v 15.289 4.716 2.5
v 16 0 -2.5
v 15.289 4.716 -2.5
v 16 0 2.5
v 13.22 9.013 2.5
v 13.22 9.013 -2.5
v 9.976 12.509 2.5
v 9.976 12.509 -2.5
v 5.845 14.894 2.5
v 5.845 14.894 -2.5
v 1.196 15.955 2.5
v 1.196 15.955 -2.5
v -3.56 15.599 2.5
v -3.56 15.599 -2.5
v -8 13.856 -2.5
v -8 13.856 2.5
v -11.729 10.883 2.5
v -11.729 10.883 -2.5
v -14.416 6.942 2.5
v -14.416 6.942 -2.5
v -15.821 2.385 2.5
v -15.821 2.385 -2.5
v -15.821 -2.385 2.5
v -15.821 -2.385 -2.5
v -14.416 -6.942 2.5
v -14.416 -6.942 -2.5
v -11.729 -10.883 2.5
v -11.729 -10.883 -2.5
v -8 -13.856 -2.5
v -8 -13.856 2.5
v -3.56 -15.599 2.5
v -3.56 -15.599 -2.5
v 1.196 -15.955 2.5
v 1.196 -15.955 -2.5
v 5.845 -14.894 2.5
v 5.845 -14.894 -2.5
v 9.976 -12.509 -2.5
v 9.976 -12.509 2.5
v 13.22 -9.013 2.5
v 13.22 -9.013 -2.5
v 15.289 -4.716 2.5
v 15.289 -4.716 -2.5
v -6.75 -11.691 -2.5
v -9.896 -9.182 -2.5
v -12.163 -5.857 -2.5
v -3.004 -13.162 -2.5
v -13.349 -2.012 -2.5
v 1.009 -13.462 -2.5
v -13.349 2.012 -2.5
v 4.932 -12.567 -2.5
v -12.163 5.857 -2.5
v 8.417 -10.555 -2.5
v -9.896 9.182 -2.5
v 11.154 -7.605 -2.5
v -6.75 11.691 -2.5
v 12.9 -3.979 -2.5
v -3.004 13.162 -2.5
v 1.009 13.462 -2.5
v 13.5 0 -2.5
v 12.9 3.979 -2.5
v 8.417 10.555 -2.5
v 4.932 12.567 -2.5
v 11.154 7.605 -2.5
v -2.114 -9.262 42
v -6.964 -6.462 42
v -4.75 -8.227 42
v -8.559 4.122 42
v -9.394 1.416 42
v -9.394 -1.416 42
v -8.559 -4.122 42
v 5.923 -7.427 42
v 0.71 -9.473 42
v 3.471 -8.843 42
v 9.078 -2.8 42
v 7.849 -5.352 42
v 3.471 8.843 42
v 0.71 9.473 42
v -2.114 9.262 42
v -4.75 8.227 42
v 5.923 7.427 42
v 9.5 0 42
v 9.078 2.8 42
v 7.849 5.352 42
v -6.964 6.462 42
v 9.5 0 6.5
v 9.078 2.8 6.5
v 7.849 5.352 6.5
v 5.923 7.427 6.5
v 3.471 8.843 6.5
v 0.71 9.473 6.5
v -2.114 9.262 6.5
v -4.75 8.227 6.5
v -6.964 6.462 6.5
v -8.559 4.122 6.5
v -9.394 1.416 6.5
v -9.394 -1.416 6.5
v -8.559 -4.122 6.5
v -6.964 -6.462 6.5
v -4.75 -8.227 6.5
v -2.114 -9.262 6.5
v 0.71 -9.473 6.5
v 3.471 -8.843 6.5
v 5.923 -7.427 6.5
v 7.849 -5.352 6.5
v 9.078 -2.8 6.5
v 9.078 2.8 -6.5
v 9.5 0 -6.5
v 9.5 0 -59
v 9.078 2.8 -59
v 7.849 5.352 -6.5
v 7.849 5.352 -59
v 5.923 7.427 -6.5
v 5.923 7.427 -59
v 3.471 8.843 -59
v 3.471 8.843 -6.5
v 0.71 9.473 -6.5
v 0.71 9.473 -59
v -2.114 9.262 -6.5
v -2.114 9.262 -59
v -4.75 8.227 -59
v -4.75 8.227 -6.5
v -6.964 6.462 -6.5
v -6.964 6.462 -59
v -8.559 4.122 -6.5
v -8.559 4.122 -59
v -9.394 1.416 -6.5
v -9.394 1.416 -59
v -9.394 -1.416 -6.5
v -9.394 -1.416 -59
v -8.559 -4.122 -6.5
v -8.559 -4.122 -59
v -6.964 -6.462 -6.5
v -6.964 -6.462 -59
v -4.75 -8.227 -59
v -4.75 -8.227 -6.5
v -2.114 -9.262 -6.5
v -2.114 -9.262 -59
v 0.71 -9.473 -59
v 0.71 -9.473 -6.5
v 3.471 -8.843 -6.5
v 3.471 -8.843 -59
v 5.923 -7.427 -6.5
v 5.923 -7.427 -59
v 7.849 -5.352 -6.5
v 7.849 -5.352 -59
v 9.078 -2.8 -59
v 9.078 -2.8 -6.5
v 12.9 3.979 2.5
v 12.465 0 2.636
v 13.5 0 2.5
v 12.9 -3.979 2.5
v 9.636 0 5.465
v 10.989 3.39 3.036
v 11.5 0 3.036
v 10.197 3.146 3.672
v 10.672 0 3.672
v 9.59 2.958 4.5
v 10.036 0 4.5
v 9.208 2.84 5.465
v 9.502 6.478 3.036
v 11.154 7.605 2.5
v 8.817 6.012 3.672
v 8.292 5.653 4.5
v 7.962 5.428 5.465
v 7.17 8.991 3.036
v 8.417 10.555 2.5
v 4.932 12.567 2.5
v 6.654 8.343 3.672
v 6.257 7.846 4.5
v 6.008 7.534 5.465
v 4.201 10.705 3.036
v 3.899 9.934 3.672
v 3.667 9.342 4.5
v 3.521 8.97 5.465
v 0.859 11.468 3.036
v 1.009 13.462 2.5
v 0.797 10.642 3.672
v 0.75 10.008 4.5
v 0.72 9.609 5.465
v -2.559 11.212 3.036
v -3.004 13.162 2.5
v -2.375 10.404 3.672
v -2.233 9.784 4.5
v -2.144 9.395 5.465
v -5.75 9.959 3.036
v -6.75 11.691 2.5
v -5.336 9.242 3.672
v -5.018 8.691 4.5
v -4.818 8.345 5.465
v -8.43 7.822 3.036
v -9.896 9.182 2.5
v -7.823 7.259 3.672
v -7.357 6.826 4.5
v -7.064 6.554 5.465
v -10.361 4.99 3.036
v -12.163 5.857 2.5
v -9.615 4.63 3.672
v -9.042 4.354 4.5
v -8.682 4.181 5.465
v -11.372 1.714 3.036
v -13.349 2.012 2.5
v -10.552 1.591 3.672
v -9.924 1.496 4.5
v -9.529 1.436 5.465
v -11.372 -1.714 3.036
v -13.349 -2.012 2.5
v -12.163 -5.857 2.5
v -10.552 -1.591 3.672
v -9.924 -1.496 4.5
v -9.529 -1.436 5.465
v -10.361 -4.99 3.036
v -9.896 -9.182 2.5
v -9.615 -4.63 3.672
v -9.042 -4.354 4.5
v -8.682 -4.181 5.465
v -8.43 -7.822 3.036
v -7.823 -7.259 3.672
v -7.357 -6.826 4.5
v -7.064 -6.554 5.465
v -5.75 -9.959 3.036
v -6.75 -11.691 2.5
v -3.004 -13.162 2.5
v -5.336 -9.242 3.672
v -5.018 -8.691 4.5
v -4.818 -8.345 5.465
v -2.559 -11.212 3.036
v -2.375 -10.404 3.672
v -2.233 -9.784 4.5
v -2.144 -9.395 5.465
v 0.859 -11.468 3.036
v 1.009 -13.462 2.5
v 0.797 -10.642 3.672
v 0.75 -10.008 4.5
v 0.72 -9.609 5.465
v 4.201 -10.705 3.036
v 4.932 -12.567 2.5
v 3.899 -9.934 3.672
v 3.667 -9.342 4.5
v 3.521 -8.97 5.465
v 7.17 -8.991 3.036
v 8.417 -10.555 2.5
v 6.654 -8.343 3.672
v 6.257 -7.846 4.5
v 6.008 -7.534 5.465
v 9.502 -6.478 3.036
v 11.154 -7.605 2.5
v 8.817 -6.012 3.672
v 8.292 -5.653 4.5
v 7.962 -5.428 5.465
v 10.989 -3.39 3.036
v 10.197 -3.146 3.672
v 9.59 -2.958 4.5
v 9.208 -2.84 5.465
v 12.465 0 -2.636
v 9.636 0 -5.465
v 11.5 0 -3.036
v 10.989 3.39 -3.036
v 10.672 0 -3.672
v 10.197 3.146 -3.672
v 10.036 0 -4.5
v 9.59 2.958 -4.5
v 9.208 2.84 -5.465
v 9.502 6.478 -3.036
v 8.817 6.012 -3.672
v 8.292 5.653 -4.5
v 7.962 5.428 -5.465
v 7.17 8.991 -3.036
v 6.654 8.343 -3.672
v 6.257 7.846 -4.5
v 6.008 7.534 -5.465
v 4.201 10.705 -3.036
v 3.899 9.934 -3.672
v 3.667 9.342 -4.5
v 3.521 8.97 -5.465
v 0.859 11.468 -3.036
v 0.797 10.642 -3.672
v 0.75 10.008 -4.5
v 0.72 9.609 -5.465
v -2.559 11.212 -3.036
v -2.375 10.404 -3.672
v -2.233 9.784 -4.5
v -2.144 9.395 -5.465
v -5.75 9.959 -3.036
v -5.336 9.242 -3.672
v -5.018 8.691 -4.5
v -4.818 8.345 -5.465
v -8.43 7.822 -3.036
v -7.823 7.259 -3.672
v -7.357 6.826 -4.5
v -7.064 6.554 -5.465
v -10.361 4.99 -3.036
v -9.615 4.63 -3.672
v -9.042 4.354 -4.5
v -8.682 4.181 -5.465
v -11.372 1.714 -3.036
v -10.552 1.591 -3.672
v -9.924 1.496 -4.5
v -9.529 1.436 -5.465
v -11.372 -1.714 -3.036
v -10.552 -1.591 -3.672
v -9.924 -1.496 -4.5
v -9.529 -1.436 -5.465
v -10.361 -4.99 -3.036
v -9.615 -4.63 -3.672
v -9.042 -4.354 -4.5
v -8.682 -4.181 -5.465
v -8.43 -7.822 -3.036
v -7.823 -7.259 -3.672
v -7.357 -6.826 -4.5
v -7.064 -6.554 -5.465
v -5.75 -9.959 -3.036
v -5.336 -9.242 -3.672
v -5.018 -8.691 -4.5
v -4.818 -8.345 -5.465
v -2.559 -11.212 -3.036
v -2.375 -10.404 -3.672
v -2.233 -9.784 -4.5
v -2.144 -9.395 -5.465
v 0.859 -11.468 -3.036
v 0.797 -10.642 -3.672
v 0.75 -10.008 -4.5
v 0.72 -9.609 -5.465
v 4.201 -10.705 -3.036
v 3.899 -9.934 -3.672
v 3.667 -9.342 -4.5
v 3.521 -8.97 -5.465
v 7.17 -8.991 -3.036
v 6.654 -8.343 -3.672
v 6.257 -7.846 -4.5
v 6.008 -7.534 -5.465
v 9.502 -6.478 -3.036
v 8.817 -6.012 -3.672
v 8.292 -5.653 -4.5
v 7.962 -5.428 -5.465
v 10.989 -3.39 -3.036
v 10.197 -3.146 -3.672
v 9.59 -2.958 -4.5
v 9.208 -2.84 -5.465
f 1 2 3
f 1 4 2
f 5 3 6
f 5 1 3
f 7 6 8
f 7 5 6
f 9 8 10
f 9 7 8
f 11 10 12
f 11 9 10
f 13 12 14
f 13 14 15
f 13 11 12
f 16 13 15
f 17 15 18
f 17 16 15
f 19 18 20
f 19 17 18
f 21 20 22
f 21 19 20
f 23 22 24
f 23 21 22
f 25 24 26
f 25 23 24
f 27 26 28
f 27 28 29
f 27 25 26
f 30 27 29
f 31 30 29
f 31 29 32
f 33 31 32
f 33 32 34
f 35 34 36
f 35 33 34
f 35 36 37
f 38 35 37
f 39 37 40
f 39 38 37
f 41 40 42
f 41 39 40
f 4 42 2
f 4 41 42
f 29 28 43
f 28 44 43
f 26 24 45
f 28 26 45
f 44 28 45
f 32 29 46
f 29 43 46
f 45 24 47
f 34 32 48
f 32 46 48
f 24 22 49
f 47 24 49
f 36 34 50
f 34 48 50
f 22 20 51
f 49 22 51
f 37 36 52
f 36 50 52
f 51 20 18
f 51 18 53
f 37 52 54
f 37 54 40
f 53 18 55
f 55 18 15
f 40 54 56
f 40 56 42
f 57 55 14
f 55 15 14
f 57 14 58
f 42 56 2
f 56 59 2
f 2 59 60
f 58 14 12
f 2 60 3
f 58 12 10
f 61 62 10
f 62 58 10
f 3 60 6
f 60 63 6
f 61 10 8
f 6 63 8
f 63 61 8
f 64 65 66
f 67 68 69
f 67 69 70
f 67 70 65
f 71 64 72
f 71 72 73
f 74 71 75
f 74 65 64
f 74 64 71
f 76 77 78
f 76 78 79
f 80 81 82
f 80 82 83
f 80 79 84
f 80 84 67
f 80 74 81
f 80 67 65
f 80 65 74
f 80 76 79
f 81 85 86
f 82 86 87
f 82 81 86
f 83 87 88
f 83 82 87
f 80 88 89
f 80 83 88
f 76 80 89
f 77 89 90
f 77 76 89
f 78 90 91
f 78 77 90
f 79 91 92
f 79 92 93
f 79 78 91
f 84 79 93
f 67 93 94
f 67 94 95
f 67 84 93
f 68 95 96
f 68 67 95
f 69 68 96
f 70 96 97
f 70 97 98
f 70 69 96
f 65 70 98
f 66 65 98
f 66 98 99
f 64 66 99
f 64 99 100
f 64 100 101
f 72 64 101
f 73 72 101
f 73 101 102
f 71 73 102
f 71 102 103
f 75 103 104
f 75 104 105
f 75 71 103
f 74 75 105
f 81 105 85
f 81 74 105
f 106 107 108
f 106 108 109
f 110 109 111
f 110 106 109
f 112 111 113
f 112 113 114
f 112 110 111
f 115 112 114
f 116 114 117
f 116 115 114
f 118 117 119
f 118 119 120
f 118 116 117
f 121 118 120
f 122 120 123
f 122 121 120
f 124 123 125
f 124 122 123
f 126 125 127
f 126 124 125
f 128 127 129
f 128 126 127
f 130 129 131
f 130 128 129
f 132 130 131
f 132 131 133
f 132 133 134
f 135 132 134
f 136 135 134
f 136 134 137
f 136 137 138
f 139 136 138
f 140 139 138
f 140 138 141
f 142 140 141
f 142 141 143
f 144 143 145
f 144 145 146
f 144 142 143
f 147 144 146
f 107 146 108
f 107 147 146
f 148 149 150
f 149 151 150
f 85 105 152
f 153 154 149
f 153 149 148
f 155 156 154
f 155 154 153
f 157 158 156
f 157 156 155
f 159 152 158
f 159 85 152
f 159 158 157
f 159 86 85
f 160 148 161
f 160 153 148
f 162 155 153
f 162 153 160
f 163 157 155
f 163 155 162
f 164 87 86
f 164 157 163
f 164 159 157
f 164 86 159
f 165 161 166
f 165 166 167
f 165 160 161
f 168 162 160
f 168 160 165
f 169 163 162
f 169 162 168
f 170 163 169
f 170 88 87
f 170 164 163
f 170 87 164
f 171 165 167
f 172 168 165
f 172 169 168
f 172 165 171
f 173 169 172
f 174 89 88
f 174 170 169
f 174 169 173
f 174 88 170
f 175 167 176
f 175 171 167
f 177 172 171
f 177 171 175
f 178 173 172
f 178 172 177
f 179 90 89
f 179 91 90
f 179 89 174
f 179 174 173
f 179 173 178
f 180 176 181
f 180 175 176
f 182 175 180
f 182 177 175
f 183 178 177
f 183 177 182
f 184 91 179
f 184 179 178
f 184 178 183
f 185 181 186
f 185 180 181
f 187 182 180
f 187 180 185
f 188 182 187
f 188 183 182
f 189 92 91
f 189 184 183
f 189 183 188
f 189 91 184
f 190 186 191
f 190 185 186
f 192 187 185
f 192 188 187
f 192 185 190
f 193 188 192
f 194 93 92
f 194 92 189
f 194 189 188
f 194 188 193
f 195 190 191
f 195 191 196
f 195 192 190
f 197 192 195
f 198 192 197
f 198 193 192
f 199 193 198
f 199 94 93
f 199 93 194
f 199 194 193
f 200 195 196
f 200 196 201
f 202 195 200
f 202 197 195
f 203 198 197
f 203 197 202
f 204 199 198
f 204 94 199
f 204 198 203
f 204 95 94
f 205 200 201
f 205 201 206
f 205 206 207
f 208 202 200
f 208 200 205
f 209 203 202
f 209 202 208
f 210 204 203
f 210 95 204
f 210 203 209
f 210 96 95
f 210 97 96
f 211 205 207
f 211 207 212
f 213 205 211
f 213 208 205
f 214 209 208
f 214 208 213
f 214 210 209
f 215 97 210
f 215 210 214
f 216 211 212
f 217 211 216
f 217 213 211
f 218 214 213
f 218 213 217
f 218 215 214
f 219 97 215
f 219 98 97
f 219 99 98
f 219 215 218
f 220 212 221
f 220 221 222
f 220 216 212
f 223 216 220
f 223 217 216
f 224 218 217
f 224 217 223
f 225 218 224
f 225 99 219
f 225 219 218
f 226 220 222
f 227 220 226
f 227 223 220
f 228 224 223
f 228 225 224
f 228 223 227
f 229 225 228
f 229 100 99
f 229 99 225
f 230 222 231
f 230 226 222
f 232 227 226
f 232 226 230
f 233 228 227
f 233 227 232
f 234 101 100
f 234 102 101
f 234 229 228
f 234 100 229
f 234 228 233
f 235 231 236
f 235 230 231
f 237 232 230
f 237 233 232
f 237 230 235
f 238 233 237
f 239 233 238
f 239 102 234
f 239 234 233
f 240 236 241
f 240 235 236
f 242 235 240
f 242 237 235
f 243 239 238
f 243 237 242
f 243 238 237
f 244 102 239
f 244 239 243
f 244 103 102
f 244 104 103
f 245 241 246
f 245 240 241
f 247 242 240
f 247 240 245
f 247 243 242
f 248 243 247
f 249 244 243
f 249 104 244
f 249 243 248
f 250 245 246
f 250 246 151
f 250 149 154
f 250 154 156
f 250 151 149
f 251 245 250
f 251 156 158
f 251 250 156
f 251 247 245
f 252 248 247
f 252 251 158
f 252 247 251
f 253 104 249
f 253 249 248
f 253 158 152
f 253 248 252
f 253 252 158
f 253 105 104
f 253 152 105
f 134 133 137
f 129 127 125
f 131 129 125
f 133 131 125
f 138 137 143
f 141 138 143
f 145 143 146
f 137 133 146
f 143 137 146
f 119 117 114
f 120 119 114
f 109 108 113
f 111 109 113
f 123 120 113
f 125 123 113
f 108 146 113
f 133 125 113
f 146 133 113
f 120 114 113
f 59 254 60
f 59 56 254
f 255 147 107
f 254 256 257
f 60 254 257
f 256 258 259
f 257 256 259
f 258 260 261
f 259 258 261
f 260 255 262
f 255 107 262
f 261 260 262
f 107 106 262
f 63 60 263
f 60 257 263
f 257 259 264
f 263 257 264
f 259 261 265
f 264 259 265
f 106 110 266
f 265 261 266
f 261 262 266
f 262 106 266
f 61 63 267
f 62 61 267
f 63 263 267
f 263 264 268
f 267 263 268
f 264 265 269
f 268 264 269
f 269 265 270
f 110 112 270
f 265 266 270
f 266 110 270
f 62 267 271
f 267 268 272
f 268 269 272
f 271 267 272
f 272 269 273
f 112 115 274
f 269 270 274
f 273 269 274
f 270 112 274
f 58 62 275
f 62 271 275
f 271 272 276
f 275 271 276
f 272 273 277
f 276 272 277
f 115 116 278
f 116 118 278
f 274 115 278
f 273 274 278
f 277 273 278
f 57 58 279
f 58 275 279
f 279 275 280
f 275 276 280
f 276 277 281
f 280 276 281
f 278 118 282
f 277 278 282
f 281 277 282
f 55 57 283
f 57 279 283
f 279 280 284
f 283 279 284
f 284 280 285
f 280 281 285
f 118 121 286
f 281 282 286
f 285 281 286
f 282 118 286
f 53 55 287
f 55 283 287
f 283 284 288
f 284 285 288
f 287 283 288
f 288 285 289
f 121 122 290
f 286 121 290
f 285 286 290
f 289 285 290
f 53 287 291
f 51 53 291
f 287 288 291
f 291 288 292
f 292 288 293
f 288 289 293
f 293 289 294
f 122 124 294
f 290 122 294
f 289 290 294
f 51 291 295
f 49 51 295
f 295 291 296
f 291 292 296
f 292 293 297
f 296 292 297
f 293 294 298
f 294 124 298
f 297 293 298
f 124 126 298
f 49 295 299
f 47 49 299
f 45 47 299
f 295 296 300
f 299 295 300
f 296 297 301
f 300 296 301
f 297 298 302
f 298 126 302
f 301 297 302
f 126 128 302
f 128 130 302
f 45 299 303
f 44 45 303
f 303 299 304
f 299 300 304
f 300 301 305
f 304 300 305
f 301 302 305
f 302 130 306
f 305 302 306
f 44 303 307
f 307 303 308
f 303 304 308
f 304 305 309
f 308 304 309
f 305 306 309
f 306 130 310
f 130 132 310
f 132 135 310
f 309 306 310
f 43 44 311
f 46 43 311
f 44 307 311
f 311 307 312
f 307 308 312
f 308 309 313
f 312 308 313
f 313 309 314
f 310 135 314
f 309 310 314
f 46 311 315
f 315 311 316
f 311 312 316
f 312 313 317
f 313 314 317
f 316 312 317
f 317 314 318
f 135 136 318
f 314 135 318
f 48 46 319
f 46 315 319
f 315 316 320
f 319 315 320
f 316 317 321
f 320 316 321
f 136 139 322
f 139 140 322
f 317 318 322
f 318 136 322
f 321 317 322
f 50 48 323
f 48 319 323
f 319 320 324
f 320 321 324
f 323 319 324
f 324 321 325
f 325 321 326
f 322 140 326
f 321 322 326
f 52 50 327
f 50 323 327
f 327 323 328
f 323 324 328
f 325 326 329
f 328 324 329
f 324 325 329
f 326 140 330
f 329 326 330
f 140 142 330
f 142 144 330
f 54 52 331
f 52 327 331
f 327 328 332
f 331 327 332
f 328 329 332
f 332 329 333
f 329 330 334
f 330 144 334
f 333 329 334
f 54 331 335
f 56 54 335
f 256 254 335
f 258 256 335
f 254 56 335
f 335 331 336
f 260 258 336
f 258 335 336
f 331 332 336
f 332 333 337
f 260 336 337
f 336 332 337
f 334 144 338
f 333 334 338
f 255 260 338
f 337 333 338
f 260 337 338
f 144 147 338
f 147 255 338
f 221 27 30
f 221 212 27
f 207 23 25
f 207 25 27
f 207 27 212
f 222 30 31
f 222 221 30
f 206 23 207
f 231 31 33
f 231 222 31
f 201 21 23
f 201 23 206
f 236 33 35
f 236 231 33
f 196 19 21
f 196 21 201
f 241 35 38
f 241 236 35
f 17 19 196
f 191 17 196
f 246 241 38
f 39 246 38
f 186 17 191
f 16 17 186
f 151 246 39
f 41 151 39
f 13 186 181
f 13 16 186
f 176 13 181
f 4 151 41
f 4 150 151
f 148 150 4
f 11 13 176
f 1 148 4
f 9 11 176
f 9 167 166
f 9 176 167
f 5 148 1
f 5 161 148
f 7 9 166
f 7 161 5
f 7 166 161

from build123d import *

# Parameters (mm, degrees)
F0_R          = 9.5
F1_DEPTH      = 42
F1_DEPTH_BACK = 59
F2_R          = 16
F3_DEPTH      = 2.5
F3_DEPTH_BACK = 2.5
F4_R          = 4


with BuildPart() as f1:
    # F0 (on Top) → F1 (new body, two sides)
    with BuildSketch(Plane.XY) as f1_sk:
        Circle(F0_R)
    extrude(amount=F1_DEPTH)
    extrude(f1_sk.sketch, amount=-F1_DEPTH_BACK)

    # F2 (on Top) → F3 (join, two sides)
    with BuildSketch(Plane.XY) as f3_sk:
        Circle(F2_R)
    extrude(amount=F3_DEPTH)
    extrude(f3_sk.sketch, amount=-F3_DEPTH_BACK)

    # F4
    f4_edges = [f1.edges().sort_by_distance(p)[0] for p in [
        (-9.5, 0, -2.5),
        (-9.5, 0, 2.5),
    ]]
    fillet(f4_edges, radius=F4_R)


solid = f1.part
